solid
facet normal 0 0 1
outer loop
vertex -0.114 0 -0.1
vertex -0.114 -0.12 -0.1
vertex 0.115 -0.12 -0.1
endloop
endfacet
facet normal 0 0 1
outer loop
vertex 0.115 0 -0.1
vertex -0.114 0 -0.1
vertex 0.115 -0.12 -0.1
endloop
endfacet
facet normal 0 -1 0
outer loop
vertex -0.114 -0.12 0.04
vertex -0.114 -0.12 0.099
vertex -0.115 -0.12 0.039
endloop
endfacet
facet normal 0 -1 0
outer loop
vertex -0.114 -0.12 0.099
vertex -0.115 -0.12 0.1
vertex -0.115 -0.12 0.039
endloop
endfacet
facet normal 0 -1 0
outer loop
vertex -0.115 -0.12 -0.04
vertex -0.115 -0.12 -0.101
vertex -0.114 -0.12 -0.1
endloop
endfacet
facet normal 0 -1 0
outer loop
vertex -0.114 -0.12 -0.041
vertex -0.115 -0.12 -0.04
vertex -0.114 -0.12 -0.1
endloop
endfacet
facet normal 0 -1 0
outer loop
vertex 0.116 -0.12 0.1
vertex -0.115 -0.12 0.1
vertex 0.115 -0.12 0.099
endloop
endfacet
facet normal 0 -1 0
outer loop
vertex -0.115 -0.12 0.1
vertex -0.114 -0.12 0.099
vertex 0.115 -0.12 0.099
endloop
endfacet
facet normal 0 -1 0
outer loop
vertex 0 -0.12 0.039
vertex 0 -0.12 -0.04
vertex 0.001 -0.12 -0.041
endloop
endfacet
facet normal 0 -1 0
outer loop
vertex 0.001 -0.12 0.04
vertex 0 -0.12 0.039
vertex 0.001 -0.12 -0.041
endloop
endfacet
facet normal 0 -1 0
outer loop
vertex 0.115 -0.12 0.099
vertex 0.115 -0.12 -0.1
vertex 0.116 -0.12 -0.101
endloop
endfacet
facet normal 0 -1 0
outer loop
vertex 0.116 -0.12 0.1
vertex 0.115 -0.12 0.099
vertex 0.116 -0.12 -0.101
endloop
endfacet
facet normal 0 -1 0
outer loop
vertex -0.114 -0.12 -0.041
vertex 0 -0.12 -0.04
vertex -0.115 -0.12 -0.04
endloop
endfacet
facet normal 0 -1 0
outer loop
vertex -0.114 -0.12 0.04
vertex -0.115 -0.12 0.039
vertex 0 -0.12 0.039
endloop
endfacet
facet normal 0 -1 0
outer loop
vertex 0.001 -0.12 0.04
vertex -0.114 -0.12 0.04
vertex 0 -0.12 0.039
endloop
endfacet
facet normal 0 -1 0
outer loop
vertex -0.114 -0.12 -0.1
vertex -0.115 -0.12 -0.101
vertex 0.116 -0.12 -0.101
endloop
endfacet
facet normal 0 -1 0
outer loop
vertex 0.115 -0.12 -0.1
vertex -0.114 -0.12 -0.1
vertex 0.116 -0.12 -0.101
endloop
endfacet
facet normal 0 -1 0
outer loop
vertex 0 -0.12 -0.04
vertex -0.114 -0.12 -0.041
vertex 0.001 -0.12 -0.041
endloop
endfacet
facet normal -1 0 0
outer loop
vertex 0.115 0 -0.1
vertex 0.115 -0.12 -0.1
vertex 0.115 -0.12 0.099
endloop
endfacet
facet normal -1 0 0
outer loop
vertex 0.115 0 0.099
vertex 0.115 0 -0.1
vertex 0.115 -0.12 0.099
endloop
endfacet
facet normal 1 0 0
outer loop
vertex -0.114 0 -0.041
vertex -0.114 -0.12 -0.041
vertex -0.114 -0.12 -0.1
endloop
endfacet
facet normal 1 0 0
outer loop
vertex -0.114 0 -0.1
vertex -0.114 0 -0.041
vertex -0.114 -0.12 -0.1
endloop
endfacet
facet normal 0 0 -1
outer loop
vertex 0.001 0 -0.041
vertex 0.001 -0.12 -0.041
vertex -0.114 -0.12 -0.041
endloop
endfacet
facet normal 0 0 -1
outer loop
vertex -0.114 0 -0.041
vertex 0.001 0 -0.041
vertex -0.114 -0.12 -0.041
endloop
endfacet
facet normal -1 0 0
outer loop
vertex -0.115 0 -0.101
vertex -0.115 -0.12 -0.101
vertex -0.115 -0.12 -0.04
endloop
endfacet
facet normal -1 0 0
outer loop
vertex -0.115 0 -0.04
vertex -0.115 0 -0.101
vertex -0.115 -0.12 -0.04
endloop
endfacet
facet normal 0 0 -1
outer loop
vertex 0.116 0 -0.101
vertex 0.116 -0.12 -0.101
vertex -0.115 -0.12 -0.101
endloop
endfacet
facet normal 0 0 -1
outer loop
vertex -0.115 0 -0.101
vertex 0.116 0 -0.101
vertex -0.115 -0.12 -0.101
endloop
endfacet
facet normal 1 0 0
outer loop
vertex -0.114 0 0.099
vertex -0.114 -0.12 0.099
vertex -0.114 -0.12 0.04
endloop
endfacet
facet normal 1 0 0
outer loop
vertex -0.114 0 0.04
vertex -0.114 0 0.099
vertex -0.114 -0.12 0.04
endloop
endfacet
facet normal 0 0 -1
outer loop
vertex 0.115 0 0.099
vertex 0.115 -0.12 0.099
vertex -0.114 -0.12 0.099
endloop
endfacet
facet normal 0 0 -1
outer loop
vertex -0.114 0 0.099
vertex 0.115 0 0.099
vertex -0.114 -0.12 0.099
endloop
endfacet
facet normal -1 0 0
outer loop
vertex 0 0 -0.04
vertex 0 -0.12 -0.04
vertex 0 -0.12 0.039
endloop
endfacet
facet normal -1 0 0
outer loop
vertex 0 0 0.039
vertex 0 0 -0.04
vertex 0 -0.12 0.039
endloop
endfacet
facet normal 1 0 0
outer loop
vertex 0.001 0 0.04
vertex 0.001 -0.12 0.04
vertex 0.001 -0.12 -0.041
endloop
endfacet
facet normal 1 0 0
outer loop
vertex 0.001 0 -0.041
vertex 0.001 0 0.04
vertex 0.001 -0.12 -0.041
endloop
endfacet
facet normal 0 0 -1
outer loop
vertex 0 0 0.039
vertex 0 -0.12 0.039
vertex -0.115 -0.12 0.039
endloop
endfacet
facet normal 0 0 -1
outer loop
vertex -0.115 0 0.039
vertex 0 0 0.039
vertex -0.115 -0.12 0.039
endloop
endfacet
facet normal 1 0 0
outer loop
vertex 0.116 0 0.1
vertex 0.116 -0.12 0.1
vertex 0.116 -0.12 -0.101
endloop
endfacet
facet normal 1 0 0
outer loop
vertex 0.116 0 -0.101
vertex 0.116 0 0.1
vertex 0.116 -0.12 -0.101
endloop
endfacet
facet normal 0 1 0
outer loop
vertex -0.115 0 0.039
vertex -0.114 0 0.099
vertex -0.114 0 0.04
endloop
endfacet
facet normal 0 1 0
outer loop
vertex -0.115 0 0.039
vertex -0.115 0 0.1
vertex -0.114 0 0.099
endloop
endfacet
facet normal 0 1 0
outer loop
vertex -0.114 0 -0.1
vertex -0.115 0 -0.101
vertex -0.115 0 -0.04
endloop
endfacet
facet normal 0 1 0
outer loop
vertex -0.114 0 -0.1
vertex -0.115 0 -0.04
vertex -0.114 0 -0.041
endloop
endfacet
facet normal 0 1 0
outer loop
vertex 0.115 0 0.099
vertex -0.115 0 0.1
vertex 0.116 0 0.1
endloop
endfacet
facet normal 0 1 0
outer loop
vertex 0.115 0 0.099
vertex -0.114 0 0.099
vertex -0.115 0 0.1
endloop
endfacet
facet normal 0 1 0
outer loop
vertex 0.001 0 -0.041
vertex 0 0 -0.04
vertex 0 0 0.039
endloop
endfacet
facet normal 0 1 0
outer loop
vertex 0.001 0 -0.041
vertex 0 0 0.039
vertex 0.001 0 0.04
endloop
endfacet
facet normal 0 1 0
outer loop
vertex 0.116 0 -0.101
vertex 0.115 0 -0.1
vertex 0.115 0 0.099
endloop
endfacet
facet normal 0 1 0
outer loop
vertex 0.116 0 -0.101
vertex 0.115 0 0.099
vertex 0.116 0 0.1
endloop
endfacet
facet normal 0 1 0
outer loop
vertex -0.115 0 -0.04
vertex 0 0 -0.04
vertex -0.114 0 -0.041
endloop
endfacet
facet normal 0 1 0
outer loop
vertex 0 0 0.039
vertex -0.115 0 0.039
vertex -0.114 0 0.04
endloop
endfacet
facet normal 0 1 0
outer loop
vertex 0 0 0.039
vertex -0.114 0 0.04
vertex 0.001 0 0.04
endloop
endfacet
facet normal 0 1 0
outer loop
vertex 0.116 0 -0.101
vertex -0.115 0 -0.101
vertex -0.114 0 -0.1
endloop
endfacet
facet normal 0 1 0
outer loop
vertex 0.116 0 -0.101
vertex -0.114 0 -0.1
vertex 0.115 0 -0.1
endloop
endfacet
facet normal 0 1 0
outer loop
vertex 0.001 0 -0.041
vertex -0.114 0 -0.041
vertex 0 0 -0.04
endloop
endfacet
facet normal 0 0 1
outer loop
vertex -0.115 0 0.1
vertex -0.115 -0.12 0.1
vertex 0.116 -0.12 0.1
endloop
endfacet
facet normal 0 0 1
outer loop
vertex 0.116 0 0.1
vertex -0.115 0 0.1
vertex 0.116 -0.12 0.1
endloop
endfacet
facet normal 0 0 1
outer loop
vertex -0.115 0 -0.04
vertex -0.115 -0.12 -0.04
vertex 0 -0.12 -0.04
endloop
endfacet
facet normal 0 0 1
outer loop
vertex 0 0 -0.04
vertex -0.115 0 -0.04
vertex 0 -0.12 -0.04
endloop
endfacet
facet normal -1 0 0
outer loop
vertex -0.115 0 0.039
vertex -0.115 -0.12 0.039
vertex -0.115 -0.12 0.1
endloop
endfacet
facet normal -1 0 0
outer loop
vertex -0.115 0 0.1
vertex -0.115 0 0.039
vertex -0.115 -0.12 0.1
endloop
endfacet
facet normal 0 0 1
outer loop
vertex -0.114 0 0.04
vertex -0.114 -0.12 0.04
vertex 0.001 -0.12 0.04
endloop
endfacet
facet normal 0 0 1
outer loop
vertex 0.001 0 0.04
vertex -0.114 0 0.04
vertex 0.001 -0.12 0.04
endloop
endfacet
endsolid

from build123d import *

# Parameters (mm, degrees)
EXTRUDE_THIN1_START = -120
EXTRUDE_THIN1_DEPTH = 120
SCALE1_SCALE        = 0.001


# Read off the part's stored shape, not the designer's step: Extrude-Thin1
with BuildPart() as part:
    # Extrude-Thin1 outline → Extrude-Thin1 (new body)
    with BuildSketch(Plane(origin=(0, 0, 0), x_dir=(1, 0, 0), z_dir=(0, 1, 0)).offset(EXTRUDE_THIN1_START)):
        Polygon((-115, 40), (0, 40), (0, -39), (-115, -39), (-115, -100), (116, -100), (116, 101), (-115, 101), align=None)
        Polygon((1, -40), (1, 41), (-114, 41), (-114, 100), (115, 100), (115, -99), (-114, -99), (-114, -40), align=None, mode=Mode.SUBTRACT)
    extrude(amount=EXTRUDE_THIN1_DEPTH)


with BuildPart() as part_1:
    # Scale1: scaled about (0, 0, 0)
    add(part.part.scale(SCALE1_SCALE))


solid = part_1.part
